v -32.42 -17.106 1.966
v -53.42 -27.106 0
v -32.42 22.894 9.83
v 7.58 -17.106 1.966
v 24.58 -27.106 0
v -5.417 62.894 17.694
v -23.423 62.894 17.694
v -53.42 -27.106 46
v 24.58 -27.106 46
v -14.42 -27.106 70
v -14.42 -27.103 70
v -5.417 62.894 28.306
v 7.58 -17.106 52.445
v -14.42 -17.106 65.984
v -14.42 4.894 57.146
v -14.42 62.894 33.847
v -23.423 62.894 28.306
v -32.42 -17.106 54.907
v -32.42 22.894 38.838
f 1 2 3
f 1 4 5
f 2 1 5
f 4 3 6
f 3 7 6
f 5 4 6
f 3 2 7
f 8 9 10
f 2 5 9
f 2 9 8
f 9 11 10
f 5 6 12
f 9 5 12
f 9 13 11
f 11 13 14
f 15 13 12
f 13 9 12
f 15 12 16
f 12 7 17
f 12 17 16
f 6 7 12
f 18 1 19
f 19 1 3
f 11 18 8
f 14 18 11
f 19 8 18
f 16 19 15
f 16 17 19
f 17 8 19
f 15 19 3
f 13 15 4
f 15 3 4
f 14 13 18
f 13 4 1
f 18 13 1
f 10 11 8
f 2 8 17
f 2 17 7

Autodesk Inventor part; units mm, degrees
sketch "Эскиз1" plane through (0, 0, 0) normal (0, 0, 1) x (1, 0, 0)
  line L0 (-53.4198, 62.894) -> (24.5802, 62.894)
  line L1 (24.5802, 62.894) -> (24.5802, -27.106)
  line L2 (24.5802, -27.106) -> (-53.4198, -27.106)
  line L3 (-53.4198, -27.106) -> (-53.4198, 62.894)
  line L4 (7.5802, -17.106) -> (-32.4198, -17.106)
  line L5 (-32.4198, -17.106) -> (-32.4198, 22.894)
  line L6 (-32.4198, 22.894) -> (7.5802, -17.106)
  point P0 (0, 0)
  point P1 (-14.4198, -27.106)
  point P2 (-14.4198, -17.106)
  dimension "d0" = 78
  dimension "d1" = 90
  dimension "d4" = 18
  dimension "d5" = 0
  dimension "d6" = 40
  dimension "d7" = 40
  dimension "d8" = 10
extrude "Выдавливание1" add sketch "Эскиз1" along normal blind 70
sketch "Эскиз3" plane through (-53.4198, 62.894, 0) normal (0, 1, 0) x (1, 0, 0)
  line L0 (78, -70) -> (0, -70) projected
  line L1 (39, -70) -> (78, -46)
  line L2 (78, 0) -> (78, -70) projected
  line L3 (78, 0) -> (0, 0) projected
  line L4 (39, -70) -> (0, -46)
  line L5 (0, 0) -> (0, -70) projected
  line L6 (0, -46) -> (0, 0)
  line L7 (0, 0) -> (78, 0)
  line L8 (78, 0) -> (78, -46)
  point P0 (53.4198, 0)
  dimension "d14" = 46
extrude "Выдавливание2" cut sketch "Эскиз3" against normal blind 1000 contours L4 L5 L3 L2 L1 keep common part
sketch "Эскиз4" plane through (-53.4198, 62.894, 0) normal (0, 1, 0) x (1, 0, 0)
  line L0 (78, 0) -> (0, 0) projected
  line L1 (0, 0) -> (78, 0)
  line L2 (0, 0) -> (0, -46) projected
  line L3 (0, -23) -> (78, -23)
  line L4 (78, 0) -> (78, -46) projected
  line L5 (39, -23) -> (78, 0)
  line L6 (78, -46) -> (39, -70) projected
  line L7 (39, -23) -> (78, -46)
  line L8 (39, -23) -> (0, -46)
  line L9 (39, -23) -> (0, 0)
  line L10 (30, -17.6923) -> (48, -17.6923)
  line L11 (48, -17.6923) -> (48, -28.3077)
  line L12 (48, -28.3077) -> (30, -28.3077)
  line L13 (30, -28.3077) -> (30, -17.6923)
  line L14 (39, -70) -> (61, -56.4615) projected
  line L15 (39, -23) -> (39, -70)
  line L16 (48, -28.3077) -> (39, -33.8468)
  line L17 (39, -33.8468) -> (30, -28.3077)
  point P0 (53.4198, 0)
  point P1 (39, -17.6923)
  point P2 (30, -23)
  dimension "d17" = 23
  dimension "d18" = 18
  dimension "d19" = 0
  dimension "d20" = 62.137
  dimension "d21" = 0
  dimension "d22" = 62.14
ref_plane "РабПлоскость1" through (-53.4198, -27.106, 46) normal (-0.4959, 0.3237, 0.8058) x (0.8517, 0, 0.5241)
ref_plane "РабПлоскость2" through (24.5802, -27.106, 46) normal (-0.4959, -0.3237, -0.8058) x (-0.8517, 0, 0.5241)
ref_plane "РабПлоскость3" through (24.5802, -27.106, 0) normal (-0.9487, -0.3162, 0) x (0, 0, 1)
ref_plane "РабПлоскость4" through (-53.4198, -27.106, 0) normal (0, -0.1929, 0.9812) x (1, 0, 0)
ref_plane "РабПлоскость5" through (-53.4198, -27.106, 46) normal (0.9487, -0.3162, 0) x (0, 0, -1)
sketch "Эскиз5" plane through (24.5802, -27.106, 46) normal (-0.4959, -0.3237, -0.8058) x (-0.8517, 0, 0.5241)
  circle A0 centre (16.0933, 68.0296) radius 120.9619
  point P0 (-3.1746, 42.498)
extrude "Выдавливание3" cut sketch "Эскиз5" along normal blind 1000 keep common part
sketch "Эскиз6" plane through (-53.4198, -27.106, 46) normal (-0.4959, 0.3237, 0.8058) x (0.8517, 0, 0.5241)
  circle A0 centre (5.8398, 44.8642) radius 111.1599
  point P0 (21.3869, 47.3906)
extrude "Выдавливание4" cut sketch "Эскиз6" against normal blind 1000 keep common part
sketch "Эскиз7" plane through (24.5802, -27.106, 0) normal (-0.9487, -0.3162, 0) x (0, 0, 1)
  circle A0 centre (24.0277, 56.8574) radius 86.5432
  point P0 (0, 33.4879)
extrude "Выдавливание5" cut sketch "Эскиз7" along normal blind 1000 keep common part
sketch "Эскиз8" plane through (-53.4198, -27.106, 0) normal (0, -0.1929, 0.9812) x (1, 0, 0)
  circle A0 centre (24.124, 48.0247) radius 96.9769
  point P0 (53.4198, 26.5969)
extrude "Выдавливание6" cut sketch "Эскиз8" along normal blind 1000 keep common part
sketch "Эскиз9" plane through (-53.4198, -27.106, 46) normal (0.9487, -0.3162, 0) x (0, 0, -1)
  circle A0 centre (10.0162, 69.3054) radius 109.293
  point P0 (46, 42.6078)
extrude "Выдавливание7" cut sketch "Эскиз9" along normal blind 1000 keep common part
properties part number "1_1"
